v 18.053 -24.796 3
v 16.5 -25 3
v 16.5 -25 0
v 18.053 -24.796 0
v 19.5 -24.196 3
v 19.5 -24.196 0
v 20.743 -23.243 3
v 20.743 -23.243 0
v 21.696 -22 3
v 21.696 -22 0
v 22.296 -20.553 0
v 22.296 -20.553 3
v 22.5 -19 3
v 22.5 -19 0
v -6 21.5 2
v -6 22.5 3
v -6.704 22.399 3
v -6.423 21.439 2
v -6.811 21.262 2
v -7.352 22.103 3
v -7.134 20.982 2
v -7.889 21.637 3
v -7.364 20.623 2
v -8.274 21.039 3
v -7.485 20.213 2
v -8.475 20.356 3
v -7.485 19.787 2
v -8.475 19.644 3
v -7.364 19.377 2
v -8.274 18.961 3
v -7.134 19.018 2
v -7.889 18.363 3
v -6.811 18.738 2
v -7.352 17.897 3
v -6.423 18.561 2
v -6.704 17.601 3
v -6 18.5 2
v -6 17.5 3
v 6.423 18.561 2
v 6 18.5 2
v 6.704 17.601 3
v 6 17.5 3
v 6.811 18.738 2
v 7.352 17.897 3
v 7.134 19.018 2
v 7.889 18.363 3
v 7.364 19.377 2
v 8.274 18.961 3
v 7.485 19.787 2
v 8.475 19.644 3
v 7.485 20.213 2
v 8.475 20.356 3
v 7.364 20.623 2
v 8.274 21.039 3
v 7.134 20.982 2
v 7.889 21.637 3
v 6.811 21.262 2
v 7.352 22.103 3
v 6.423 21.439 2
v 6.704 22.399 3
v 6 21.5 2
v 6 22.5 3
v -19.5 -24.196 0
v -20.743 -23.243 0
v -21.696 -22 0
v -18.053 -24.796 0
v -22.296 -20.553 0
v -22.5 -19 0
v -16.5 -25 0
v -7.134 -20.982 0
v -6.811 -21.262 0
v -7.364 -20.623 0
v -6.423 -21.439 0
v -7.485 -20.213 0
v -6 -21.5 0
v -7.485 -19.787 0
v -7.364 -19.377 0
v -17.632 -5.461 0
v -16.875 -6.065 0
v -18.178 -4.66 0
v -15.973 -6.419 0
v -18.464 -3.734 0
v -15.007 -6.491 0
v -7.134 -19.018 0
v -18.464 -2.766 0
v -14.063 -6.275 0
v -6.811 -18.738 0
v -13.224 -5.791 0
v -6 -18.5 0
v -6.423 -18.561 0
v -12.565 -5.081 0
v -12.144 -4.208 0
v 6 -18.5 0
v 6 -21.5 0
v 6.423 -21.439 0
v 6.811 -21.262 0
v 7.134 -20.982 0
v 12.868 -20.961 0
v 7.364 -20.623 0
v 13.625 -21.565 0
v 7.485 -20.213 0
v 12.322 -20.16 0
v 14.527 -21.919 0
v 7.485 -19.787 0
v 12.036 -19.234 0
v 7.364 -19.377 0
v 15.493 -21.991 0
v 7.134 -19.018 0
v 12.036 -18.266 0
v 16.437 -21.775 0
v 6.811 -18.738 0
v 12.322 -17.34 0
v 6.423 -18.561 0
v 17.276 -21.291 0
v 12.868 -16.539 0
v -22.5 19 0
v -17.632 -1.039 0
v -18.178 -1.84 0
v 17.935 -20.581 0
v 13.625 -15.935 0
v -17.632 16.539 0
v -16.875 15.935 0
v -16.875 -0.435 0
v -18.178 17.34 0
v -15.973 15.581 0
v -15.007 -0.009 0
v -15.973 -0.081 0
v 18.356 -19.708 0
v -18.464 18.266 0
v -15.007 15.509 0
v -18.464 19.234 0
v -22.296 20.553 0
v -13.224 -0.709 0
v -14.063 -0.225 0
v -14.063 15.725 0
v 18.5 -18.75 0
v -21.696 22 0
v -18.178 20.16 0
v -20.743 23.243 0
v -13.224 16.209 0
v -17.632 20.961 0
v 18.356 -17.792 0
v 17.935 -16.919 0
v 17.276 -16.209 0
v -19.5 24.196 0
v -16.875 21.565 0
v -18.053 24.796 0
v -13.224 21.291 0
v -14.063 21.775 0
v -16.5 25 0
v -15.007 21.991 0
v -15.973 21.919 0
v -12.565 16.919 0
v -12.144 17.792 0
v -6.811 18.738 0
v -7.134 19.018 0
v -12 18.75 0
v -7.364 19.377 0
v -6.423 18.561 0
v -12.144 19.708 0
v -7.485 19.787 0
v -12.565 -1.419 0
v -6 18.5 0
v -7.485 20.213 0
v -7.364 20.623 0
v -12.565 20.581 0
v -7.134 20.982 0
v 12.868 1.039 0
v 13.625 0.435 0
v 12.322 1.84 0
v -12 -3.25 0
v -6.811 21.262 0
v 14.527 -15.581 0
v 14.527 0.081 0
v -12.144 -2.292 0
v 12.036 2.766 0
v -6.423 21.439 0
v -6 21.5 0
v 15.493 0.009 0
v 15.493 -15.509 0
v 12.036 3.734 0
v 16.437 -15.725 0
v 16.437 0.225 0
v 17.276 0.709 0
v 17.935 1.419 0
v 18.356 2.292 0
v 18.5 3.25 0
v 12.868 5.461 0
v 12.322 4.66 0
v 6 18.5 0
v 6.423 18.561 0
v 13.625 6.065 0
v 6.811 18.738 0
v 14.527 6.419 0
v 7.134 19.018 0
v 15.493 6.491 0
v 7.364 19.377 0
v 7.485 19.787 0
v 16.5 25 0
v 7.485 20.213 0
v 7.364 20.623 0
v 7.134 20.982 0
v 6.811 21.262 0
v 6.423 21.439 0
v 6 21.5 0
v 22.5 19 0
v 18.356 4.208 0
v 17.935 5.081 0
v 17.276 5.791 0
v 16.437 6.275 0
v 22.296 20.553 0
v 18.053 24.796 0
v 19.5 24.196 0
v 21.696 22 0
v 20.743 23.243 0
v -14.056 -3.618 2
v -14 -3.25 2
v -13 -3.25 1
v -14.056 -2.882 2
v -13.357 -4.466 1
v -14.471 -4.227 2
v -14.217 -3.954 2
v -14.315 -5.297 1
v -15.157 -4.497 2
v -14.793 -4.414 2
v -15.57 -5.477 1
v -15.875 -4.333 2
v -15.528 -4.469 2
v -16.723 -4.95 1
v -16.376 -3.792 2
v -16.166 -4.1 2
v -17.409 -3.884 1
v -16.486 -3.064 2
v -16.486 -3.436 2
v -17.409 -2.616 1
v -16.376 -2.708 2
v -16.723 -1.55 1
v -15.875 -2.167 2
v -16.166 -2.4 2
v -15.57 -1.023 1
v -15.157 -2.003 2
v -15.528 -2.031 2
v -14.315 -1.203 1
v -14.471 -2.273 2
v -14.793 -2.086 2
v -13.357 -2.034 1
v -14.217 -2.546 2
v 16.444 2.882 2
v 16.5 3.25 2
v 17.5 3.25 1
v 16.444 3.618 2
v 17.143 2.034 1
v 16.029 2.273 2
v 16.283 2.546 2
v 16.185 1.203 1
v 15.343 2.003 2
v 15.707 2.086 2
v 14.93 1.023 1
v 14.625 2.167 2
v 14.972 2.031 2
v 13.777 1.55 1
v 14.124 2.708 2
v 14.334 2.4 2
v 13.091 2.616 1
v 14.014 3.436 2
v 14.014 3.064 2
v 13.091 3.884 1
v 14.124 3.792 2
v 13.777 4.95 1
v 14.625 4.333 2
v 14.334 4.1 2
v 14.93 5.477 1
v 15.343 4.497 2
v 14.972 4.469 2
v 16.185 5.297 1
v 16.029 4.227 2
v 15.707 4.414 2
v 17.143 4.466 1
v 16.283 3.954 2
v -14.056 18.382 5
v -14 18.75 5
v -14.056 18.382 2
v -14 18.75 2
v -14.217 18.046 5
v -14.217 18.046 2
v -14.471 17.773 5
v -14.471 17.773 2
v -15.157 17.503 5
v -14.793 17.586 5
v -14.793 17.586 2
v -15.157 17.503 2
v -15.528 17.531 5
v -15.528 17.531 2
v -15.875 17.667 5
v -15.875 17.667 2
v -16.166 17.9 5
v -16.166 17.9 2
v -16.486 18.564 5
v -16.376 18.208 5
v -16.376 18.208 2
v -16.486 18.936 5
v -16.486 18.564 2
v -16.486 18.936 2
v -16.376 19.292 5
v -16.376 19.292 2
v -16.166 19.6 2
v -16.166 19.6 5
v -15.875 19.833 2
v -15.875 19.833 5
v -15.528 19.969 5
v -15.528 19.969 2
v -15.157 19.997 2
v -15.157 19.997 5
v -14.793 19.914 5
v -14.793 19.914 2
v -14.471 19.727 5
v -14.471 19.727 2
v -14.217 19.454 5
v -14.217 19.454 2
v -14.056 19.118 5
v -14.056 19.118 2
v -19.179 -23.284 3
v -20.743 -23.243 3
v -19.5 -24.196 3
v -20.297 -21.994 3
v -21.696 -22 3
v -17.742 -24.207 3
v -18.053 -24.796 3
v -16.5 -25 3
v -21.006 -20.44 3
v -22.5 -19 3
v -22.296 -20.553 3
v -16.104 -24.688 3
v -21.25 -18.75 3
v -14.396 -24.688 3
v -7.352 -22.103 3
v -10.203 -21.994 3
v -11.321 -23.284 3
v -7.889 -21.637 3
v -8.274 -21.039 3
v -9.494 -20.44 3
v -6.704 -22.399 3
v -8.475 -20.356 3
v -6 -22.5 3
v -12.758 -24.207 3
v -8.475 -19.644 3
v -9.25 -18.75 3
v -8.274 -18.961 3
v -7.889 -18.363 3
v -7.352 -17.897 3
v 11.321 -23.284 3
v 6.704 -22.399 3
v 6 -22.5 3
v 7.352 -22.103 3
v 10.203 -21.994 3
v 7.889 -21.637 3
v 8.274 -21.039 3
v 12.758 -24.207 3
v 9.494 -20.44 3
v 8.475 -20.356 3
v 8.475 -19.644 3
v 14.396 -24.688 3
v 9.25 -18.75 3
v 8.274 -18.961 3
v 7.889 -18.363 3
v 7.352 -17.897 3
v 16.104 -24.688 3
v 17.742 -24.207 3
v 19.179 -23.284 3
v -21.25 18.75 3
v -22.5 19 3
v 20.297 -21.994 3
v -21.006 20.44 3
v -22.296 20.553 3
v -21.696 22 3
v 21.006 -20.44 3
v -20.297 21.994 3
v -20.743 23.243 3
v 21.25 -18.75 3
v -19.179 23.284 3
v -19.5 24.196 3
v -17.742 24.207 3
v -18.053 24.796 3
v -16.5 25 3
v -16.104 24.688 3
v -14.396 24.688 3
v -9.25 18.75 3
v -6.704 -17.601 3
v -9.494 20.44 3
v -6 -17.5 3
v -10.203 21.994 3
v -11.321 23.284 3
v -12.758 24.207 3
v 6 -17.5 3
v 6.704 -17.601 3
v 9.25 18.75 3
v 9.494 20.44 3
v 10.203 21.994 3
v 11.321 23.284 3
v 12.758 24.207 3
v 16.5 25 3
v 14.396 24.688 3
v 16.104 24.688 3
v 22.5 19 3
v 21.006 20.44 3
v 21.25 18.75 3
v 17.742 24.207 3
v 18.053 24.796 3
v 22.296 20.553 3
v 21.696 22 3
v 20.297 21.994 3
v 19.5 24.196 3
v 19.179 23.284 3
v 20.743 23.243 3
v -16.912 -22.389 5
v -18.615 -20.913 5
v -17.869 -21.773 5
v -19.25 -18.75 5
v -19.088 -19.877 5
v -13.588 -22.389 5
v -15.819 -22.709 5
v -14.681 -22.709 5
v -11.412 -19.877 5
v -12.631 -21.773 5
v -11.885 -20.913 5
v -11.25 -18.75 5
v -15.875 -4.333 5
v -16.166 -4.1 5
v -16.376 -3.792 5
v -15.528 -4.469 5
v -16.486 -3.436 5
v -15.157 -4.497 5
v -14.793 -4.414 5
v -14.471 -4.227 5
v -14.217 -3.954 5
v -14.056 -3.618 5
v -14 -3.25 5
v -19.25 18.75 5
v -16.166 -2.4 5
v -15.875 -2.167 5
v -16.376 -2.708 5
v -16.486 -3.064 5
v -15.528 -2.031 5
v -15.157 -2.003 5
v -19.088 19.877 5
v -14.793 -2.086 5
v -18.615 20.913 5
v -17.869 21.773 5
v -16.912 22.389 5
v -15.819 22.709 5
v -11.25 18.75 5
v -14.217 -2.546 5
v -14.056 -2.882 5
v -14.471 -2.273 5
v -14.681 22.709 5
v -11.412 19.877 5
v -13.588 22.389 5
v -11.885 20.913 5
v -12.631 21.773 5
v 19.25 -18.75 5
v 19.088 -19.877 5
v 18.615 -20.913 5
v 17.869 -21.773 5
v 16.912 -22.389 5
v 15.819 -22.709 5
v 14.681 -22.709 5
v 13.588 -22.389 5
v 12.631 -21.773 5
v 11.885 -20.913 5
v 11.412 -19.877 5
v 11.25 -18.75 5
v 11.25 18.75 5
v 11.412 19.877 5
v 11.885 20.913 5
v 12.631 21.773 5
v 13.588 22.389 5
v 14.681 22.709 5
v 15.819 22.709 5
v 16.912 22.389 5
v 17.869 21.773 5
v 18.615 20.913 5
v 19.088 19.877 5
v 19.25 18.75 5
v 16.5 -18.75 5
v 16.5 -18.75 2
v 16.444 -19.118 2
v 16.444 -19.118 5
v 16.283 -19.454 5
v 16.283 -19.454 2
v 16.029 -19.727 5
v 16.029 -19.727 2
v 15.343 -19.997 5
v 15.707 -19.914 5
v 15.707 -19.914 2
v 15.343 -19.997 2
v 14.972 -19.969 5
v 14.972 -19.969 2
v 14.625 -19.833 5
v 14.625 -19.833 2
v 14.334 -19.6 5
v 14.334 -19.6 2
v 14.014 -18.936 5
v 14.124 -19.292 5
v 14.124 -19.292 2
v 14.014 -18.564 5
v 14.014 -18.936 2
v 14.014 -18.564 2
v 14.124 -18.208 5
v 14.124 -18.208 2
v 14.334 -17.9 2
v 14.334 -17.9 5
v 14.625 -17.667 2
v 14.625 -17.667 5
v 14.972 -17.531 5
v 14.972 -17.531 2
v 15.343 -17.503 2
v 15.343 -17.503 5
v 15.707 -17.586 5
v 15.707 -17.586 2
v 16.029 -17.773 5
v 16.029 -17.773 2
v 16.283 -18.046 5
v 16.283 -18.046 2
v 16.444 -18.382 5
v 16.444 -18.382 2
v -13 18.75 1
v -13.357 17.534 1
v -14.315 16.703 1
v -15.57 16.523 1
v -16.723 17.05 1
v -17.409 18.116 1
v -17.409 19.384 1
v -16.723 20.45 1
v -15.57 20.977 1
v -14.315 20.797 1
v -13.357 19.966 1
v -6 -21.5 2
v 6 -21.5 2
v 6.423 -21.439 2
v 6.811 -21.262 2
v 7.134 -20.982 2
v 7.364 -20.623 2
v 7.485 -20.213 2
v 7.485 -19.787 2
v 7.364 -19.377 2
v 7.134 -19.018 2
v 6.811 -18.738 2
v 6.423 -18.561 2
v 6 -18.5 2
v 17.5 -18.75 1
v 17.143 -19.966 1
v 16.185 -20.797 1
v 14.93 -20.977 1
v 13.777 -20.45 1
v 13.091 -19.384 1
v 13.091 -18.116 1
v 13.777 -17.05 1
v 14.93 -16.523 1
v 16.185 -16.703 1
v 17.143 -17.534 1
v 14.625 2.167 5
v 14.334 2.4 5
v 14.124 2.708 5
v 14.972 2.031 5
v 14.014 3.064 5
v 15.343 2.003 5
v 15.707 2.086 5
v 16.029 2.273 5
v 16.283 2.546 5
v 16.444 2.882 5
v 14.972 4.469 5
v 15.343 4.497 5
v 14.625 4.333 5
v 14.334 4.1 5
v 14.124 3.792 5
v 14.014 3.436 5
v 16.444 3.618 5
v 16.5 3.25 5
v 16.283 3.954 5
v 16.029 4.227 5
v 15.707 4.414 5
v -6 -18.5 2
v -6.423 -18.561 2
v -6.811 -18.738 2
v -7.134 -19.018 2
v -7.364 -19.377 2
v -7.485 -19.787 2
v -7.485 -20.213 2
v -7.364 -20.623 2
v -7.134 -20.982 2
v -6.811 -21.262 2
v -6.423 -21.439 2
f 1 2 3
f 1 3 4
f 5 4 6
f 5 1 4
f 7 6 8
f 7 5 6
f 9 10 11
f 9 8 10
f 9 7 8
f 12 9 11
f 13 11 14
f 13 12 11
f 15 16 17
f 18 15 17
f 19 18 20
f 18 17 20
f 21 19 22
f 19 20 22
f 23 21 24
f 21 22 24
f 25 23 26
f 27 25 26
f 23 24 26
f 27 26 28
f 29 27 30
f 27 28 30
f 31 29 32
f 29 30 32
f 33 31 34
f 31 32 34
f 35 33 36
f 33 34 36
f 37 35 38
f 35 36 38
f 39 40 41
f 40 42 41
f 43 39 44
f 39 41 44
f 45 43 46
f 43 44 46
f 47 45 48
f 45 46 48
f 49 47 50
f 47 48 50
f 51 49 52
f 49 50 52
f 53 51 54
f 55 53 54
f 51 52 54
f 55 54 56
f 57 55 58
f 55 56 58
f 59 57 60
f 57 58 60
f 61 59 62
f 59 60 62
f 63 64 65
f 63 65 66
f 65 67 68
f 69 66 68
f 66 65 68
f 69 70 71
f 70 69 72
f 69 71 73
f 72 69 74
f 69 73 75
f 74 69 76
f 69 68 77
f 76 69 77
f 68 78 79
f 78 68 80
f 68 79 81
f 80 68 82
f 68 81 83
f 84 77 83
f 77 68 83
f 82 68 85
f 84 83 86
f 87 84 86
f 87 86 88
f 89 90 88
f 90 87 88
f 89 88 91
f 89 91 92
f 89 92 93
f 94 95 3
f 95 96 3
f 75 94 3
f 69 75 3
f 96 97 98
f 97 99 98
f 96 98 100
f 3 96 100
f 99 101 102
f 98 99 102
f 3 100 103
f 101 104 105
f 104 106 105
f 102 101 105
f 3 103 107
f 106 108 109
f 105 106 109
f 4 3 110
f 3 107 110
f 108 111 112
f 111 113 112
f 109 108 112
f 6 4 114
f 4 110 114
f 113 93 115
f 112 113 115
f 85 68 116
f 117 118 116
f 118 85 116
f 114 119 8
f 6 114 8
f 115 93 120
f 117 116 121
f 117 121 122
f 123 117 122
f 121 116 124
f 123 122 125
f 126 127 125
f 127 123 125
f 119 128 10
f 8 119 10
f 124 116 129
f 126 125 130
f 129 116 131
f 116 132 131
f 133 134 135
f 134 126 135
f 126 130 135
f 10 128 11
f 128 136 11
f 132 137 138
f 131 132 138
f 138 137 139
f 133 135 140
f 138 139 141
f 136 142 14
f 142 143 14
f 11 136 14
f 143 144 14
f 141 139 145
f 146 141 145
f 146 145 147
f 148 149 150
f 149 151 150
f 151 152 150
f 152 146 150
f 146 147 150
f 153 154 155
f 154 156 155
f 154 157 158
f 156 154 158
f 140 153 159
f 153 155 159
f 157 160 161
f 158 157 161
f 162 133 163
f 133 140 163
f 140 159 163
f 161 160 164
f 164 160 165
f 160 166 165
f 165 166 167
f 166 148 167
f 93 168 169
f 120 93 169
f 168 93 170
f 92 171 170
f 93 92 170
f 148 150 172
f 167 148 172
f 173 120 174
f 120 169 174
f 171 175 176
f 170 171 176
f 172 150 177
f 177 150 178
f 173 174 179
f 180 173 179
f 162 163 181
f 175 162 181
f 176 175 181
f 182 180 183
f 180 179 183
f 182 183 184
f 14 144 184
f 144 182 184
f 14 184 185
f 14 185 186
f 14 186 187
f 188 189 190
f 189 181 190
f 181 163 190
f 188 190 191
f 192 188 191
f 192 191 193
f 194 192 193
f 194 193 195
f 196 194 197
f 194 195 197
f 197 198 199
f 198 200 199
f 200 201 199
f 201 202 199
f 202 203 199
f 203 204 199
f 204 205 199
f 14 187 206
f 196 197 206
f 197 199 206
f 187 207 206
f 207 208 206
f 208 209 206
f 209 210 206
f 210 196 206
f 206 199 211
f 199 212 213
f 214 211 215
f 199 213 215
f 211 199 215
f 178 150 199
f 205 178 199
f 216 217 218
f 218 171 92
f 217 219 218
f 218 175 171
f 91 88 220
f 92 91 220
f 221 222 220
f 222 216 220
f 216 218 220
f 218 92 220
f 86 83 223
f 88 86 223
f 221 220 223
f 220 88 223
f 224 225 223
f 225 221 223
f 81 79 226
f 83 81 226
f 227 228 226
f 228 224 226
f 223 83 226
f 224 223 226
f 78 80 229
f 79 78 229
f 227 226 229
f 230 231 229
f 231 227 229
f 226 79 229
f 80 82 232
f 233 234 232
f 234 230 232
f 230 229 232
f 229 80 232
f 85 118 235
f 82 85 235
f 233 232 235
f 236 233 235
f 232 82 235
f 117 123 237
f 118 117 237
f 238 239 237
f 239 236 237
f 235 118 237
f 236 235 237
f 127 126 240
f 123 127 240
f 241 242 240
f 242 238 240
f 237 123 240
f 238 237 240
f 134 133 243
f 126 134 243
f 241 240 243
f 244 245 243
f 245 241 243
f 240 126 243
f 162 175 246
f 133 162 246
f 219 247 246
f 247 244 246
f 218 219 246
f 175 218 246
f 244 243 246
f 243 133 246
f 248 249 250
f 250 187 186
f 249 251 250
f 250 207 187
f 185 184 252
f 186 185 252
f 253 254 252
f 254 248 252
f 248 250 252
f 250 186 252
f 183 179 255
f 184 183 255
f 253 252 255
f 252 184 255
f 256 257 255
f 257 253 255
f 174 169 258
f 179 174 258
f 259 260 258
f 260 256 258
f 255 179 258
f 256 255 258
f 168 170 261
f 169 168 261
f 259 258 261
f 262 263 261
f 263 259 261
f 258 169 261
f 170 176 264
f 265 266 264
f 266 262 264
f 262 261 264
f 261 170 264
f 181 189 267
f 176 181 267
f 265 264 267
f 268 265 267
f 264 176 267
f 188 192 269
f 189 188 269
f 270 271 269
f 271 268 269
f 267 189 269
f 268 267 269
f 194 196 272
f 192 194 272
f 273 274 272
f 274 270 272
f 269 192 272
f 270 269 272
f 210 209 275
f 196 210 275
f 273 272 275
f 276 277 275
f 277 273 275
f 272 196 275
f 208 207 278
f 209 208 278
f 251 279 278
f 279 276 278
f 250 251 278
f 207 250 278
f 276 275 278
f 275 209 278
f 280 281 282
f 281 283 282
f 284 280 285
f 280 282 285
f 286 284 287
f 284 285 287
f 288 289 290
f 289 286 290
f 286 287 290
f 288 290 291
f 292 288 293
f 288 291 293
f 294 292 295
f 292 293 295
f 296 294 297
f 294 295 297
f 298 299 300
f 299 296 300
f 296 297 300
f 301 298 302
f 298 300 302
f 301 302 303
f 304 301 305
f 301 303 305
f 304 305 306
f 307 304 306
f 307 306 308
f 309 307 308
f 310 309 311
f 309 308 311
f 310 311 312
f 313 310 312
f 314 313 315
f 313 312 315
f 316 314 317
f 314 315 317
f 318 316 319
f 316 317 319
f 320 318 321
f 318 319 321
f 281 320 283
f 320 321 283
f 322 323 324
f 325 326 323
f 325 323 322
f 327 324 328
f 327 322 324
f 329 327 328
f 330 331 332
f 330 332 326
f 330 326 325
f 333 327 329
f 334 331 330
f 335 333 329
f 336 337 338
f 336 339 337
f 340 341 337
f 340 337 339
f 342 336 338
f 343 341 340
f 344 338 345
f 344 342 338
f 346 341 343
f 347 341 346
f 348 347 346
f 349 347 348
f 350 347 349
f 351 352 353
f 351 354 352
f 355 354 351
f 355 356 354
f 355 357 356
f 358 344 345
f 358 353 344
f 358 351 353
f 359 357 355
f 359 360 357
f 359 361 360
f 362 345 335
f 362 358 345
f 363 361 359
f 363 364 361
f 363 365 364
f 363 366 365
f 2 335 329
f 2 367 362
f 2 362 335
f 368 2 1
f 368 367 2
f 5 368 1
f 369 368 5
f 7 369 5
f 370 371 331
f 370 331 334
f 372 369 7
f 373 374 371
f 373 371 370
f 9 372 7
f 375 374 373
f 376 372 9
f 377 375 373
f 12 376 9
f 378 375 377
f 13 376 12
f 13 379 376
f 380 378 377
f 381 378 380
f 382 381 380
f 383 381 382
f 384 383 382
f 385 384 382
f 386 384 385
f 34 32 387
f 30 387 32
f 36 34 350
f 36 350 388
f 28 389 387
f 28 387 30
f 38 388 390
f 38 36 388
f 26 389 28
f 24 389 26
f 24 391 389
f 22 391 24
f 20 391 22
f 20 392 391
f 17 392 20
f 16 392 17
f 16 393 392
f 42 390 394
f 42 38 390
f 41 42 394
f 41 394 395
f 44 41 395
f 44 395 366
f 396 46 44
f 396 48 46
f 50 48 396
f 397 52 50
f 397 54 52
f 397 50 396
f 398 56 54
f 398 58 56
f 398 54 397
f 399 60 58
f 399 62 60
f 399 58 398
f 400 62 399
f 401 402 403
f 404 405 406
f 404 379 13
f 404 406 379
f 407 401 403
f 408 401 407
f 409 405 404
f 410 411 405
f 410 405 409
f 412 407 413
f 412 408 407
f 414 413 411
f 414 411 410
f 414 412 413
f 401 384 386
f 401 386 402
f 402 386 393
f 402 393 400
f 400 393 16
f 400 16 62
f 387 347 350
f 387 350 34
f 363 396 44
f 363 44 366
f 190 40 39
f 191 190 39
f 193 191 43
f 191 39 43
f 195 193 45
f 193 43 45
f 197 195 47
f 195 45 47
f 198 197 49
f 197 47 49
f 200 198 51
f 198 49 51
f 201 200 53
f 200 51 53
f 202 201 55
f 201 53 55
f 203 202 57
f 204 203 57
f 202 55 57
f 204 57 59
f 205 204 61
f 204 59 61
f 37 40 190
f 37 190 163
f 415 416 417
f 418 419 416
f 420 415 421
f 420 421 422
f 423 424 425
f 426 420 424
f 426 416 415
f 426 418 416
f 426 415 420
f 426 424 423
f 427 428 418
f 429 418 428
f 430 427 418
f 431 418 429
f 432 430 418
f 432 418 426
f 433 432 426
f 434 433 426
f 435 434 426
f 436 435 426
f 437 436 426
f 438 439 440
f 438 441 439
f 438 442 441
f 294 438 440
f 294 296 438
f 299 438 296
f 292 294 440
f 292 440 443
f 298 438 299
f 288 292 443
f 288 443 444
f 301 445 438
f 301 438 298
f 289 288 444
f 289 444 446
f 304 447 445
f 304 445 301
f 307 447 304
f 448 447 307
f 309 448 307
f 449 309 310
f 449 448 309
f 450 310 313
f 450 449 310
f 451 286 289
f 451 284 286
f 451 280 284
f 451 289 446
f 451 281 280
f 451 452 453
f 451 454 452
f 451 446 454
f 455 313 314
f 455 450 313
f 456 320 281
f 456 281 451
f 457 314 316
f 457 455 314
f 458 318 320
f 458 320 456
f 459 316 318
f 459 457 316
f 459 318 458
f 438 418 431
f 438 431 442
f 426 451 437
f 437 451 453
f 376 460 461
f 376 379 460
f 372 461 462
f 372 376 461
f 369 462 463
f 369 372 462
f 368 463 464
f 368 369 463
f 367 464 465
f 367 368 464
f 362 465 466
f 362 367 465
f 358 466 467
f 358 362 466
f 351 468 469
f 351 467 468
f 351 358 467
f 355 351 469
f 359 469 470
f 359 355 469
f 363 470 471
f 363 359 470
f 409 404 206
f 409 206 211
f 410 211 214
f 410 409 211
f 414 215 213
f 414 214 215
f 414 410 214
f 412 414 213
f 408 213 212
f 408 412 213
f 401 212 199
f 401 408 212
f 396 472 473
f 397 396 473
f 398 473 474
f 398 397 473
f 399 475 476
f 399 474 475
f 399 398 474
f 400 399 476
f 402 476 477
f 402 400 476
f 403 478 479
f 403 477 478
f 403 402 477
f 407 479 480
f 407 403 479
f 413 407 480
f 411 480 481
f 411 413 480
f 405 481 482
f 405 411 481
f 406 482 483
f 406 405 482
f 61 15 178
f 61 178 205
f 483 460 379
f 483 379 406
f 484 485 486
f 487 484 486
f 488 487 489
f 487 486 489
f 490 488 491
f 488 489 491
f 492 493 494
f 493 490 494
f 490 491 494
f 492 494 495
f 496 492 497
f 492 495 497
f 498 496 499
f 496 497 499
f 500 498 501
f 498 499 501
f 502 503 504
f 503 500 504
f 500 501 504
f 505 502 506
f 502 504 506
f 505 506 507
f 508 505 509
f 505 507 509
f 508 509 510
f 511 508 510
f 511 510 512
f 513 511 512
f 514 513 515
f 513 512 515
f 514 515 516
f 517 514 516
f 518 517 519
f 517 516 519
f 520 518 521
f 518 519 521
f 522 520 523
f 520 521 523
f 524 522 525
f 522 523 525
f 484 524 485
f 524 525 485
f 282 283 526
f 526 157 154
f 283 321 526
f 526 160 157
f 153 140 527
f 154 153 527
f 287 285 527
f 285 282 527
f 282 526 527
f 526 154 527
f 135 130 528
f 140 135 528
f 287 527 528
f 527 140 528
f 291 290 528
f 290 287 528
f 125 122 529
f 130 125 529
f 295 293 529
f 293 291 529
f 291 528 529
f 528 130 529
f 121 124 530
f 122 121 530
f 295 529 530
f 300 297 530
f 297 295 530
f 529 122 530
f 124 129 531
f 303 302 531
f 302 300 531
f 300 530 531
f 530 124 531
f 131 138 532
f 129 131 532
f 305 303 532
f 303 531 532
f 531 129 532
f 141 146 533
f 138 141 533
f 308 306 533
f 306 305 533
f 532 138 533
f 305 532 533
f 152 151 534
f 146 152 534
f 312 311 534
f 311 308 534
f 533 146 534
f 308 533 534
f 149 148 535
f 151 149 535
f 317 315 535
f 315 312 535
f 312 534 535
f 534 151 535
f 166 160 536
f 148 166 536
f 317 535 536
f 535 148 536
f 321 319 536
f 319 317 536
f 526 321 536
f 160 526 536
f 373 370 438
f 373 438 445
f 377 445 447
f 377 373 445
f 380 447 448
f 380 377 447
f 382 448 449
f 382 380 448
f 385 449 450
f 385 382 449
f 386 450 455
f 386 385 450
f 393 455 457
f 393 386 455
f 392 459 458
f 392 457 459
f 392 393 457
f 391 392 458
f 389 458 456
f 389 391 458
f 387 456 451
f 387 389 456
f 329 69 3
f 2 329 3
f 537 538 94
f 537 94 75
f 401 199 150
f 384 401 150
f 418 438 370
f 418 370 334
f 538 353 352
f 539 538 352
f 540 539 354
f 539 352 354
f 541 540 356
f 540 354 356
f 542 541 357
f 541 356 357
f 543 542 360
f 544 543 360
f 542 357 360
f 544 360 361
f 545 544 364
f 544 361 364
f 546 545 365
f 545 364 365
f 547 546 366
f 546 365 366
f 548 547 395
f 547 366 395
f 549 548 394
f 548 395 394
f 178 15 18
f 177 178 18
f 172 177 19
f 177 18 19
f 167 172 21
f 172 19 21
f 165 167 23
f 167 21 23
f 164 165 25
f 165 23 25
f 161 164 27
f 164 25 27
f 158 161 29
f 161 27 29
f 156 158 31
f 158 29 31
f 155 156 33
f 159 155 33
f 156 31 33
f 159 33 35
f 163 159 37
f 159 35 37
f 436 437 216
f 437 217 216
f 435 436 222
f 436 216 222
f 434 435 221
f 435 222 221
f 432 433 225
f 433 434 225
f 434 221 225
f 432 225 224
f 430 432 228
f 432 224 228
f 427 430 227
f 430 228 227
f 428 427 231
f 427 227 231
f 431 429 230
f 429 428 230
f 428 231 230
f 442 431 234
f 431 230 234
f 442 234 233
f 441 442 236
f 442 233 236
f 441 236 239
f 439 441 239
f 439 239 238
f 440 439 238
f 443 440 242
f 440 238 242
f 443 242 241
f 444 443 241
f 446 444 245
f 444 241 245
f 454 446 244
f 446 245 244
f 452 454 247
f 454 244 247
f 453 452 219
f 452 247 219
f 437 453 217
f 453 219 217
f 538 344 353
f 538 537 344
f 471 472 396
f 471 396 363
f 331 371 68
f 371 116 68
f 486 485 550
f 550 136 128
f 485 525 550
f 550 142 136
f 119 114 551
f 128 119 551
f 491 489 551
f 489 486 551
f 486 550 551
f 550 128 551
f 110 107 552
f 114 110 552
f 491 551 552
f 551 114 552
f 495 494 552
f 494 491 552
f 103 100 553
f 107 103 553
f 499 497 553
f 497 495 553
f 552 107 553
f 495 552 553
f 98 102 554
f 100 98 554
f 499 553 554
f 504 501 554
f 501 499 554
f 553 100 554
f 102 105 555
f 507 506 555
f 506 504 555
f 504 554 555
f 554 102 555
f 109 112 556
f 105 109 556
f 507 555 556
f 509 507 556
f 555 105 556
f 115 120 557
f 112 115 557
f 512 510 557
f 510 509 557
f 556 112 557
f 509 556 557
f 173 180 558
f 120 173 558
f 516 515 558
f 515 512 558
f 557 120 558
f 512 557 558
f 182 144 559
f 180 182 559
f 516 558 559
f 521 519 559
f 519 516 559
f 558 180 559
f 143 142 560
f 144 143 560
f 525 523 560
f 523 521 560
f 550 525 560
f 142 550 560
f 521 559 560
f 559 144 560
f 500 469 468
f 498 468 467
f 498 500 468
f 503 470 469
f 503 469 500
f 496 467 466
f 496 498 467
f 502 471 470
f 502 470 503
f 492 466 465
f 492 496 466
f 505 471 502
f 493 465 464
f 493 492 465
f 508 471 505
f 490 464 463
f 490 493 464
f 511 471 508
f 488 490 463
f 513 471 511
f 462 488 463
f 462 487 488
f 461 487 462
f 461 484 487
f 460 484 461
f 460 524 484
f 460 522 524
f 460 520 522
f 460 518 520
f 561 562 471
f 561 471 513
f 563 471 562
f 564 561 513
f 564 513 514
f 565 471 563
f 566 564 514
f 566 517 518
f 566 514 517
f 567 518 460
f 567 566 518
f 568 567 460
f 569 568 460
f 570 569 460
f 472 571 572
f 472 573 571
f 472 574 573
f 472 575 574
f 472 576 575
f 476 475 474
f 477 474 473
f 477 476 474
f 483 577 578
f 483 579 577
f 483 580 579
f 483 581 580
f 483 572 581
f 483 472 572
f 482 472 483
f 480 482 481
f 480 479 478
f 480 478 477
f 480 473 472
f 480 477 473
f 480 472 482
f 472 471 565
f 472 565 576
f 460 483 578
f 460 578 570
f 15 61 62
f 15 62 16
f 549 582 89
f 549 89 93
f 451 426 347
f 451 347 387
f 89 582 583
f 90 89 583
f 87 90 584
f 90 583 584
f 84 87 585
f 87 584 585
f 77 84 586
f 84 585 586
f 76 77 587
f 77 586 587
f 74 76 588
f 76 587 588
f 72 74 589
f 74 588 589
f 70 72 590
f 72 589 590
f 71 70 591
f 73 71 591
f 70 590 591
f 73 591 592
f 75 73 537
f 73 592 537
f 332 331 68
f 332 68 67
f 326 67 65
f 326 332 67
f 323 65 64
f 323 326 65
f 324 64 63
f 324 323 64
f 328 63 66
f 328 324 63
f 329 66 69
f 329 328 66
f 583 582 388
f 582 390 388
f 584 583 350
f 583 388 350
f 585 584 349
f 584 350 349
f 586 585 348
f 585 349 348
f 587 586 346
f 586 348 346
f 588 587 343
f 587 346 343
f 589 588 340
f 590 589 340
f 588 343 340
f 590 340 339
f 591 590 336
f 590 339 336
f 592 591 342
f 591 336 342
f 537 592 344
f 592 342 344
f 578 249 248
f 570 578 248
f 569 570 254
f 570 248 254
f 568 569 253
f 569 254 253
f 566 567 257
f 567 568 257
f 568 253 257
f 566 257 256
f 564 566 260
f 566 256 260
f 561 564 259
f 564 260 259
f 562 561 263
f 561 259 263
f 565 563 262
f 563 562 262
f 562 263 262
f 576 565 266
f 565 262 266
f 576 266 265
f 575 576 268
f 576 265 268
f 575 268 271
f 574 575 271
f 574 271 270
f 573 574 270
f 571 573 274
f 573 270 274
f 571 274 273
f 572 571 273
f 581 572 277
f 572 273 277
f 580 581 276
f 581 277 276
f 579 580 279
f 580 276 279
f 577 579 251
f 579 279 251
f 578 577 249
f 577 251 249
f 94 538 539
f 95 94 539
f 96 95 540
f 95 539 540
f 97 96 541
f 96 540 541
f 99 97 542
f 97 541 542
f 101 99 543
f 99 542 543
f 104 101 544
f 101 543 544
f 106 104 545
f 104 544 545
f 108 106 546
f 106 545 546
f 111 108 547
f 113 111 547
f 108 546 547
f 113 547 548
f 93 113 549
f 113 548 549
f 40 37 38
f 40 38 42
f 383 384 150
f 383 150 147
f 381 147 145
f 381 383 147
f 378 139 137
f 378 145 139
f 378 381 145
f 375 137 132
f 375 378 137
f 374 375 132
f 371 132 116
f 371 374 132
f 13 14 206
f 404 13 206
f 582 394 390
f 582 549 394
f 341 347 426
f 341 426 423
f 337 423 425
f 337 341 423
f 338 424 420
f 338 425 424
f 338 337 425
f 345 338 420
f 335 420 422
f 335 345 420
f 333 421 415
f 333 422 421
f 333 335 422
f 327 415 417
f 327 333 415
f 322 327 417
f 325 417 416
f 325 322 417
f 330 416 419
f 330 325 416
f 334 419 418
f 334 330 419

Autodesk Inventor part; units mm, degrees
ref_plane "YZ Plane" through (0, 0, 0) normal (1, 0, 0) x (0, 1, 0)
ref_plane "XZ Plane" through (0, 0, 0) normal (0, 1, 0) x (-1, 0, 0)
ref_plane "XY Plane" through (0, 0, 0) normal (0, 0, 1) x (1, 0, 0)
sketch "Skizze1" plane through (0, 0, 0) normal (0, 0, 1) x (1, 0, 0)
  line L0 (-22.5, -25) -> (22.5, -25)
  line L1 (22.5, -25) -> (22.5, 25)
  line L2 (22.5, 25) -> (-22.5, 25)
  line L3 (-22.5, 25) -> (-22.5, -25)
  line L4 (-22.5, -25) -> (22.5, 25) construction
  line L5 (22.5, -25) -> (-22.5, 25) construction
  line L6 (0, 11) -> (0, -11) construction
  line L7 (-15.25, 18.75) -> (15.25, 18.75) construction
  line L8 (15.25, 18.75) -> (15.25, 3.25) construction
  line L9 (15.25, 3.25) -> (-15.25, 3.25) construction
  line L10 (-15.25, 3.25) -> (-15.25, 18.75) construction
  line L11 (-15.25, 18.75) -> (15.25, 3.25) construction
  line L12 (15.25, 18.75) -> (-15.25, 3.25) construction
  line L13 (-17.7097, 20) -> (17.7097, 20) construction
  line L14 (17.7097, 20) -> (17.7097, 2) construction
  line L15 (17.7097, 2) -> (-17.7097, 2) construction
  line L16 (-17.7097, 2) -> (-17.7097, 20) construction
  line L17 (-17.7097, 20) -> (17.7097, 2) construction
  line L18 (17.7097, 20) -> (-17.7097, 2) construction
  line L19 (-15.25, -18.75) -> (15.25, -18.75) construction
  line L20 (15.25, -18.75) -> (15.25, -3.25) construction
  line L21 (15.25, -3.25) -> (-15.25, -3.25) construction
  line L22 (-15.25, -3.25) -> (-15.25, -18.75) construction
  line L23 (-15.25, -18.75) -> (15.25, -3.25) construction
  line L24 (15.25, -18.75) -> (-15.25, -3.25) construction
  circle A0 centre (-15.25, 18.75) radius 1.25
  circle A1 centre (15.25, 3.25) radius 1.25
  circle A2 centre (15.25, -18.75) radius 1.25
  circle A3 centre (-15.25, -3.25) radius 1.25
  point P0 (0, 0)
  point P1 (0, 0)
  dimension "d0" = 45
  dimension "d1" = 15.5
  dimension "d2" = 30.5
  dimension "d3" = 2
  dimension "d4" = 18
  dimension "d5" = 25
  dimension "d6" = 2.5
extrude "Extrusion1" add sketch "Skizze1" along normal blind 3
fillet "Rundung1" radius 6 4 edges at (-22.5, 25, 1.5) (-22.5, -25, 1.5) (22.5, -25, 1.5) (22.5, 25, 1.5)
chamfer "Fase1" distance 2 angle 45 4 edges at (-16.5, -3.25, 0) (14, -18.75, 0) (14, 3.25, 0) (-16.5, 18.75, 0)
sketch "Skizze2" plane through (0, 0, 3) normal (0, 0, 1) x (1, 0, 0)
  arc A0 (22.5, 19) -> (16.5, 25) centre (16.5, 19) ccw projected
  line L0 (16.5, 25) -> (-16.5, 25) projected
  arc A1 (-16.5, 25) -> (-22.5, 19) centre (-16.5, 19) ccw projected
  line L1 (-22.5, 19) -> (-22.5, -19) projected
  arc A2 (-22.5, -19) -> (-16.5, -25) centre (-16.5, -19) ccw projected
  line L2 (-16.5, -25) -> (16.5, -25) projected
  arc A3 (16.5, -25) -> (22.5, -19) centre (16.5, -19) ccw projected
  line L3 (22.5, -19) -> (22.5, 19) projected
  circle A4 centre (-15.25, -3.25) radius 1.25 projected
  circle A5 centre (15.25, -18.75) radius 1.25 projected
  circle A6 centre (15.25, 3.25) radius 1.25 projected
  circle A7 centre (-15.25, 18.75) radius 1.25 projected
  circle A8 centre (15.25, 3.25) radius 4
  circle A9 centre (15.25, -18.75) radius 4
  circle A10 centre (-15.25, -3.25) radius 4
  circle A11 centre (-15.25, 18.75) radius 4
  line L4 (15.25, -18.75) -> (15.25, 18.75) construction
  line L5 (19.25, -18.75) -> (19.25, 18.75)
  line L6 (11.25, 18.75) -> (11.25, -18.75)
  arc A12 (11.25, -18.75) -> (19.25, -18.75) centre (15.25, -18.75) ccw
  arc A13 (19.25, 18.75) -> (11.25, 18.75) centre (15.25, 18.75) ccw
  line L7 (-15.25, 18.75) -> (-15.25, -18.75) construction
  line L8 (-19.25, 18.75) -> (-19.25, -18.75)
  line L9 (-11.25, -18.75) -> (-11.25, 18.75)
  arc A14 (-11.25, 18.75) -> (-19.25, 18.75) centre (-15.25, 18.75) ccw
  arc A15 (-19.25, -18.75) -> (-11.25, -18.75) centre (-15.25, -18.75) ccw
  line L10 (-15.25, -18.75) -> (15.25, -18.75) construction
  line L11 (15.25, 18.75) -> (-15.25, 18.75) construction
  point P0 (0, 0)
  point P1 (15.25, 0)
  point P2 (-15.25, 0)
  dimension "d13" = 8
extrude "Extrusion2" add sketch "Skizze2" along normal blind 2 contours A8 | L5 A9 L6 A8 | A8 L6 A13 L5 | A9 | A10 | L9 A15 L8 A10 | A10 L8 A11 L9 | A11
chamfer "Fase3" distance 2 angle 45 8 edges at (15.25, 22.75, 3) (19.25, 0, 3) (15.25, -22.75, 3) (11.25, 0, 3) (-15.25, 22.75, 3) (-11.25, 0, 3) (-15.25, -22.75, 3) (-19.25, 0, 3)
sketch "Skizze4" plane through (0, 0, 3) normal (0, 0, 1) x (1, 0, 0)
  line L0 (-6, 20) -> (6, 20) construction
  line L1 (-6, 21.5) -> (6, 21.5)
  line L2 (6, 18.5) -> (-6, 18.5)
  arc A0 (-6, 21.5) -> (-6, 18.5) centre (-6, 20) ccw
  arc A1 (6, 18.5) -> (6, 21.5) centre (6, 20) ccw
  line L3 (-6, -20) -> (6, -20) construction
  line L4 (-6, -18.5) -> (6, -18.5)
  line L5 (6, -21.5) -> (-6, -21.5)
  arc A2 (-6, -18.5) -> (-6, -21.5) centre (-6, -20) ccw
  arc A3 (6, -21.5) -> (6, -18.5) centre (6, -20) ccw
  line L6 (0, -20) -> (0, 20)
  point P0 (0, 0)
  point P1 (0, 0)
  dimension "d22" = 3
  dimension "d23" = 12
  dimension "d24" = 40
extrude "Extrusion3" cut sketch "Skizze4" against normal through all
chamfer "Fase4" distance 1 angle 45 8 edges at (7.5, 20, 3) (0, 18.5, 3) (-7.5, 20, 3) (0, 21.5, 3) (7.5, -20, 3) (0, -21.5, 3) (-7.5, -20, 3) (0, -18.5, 3)
properties part number "wandler"
